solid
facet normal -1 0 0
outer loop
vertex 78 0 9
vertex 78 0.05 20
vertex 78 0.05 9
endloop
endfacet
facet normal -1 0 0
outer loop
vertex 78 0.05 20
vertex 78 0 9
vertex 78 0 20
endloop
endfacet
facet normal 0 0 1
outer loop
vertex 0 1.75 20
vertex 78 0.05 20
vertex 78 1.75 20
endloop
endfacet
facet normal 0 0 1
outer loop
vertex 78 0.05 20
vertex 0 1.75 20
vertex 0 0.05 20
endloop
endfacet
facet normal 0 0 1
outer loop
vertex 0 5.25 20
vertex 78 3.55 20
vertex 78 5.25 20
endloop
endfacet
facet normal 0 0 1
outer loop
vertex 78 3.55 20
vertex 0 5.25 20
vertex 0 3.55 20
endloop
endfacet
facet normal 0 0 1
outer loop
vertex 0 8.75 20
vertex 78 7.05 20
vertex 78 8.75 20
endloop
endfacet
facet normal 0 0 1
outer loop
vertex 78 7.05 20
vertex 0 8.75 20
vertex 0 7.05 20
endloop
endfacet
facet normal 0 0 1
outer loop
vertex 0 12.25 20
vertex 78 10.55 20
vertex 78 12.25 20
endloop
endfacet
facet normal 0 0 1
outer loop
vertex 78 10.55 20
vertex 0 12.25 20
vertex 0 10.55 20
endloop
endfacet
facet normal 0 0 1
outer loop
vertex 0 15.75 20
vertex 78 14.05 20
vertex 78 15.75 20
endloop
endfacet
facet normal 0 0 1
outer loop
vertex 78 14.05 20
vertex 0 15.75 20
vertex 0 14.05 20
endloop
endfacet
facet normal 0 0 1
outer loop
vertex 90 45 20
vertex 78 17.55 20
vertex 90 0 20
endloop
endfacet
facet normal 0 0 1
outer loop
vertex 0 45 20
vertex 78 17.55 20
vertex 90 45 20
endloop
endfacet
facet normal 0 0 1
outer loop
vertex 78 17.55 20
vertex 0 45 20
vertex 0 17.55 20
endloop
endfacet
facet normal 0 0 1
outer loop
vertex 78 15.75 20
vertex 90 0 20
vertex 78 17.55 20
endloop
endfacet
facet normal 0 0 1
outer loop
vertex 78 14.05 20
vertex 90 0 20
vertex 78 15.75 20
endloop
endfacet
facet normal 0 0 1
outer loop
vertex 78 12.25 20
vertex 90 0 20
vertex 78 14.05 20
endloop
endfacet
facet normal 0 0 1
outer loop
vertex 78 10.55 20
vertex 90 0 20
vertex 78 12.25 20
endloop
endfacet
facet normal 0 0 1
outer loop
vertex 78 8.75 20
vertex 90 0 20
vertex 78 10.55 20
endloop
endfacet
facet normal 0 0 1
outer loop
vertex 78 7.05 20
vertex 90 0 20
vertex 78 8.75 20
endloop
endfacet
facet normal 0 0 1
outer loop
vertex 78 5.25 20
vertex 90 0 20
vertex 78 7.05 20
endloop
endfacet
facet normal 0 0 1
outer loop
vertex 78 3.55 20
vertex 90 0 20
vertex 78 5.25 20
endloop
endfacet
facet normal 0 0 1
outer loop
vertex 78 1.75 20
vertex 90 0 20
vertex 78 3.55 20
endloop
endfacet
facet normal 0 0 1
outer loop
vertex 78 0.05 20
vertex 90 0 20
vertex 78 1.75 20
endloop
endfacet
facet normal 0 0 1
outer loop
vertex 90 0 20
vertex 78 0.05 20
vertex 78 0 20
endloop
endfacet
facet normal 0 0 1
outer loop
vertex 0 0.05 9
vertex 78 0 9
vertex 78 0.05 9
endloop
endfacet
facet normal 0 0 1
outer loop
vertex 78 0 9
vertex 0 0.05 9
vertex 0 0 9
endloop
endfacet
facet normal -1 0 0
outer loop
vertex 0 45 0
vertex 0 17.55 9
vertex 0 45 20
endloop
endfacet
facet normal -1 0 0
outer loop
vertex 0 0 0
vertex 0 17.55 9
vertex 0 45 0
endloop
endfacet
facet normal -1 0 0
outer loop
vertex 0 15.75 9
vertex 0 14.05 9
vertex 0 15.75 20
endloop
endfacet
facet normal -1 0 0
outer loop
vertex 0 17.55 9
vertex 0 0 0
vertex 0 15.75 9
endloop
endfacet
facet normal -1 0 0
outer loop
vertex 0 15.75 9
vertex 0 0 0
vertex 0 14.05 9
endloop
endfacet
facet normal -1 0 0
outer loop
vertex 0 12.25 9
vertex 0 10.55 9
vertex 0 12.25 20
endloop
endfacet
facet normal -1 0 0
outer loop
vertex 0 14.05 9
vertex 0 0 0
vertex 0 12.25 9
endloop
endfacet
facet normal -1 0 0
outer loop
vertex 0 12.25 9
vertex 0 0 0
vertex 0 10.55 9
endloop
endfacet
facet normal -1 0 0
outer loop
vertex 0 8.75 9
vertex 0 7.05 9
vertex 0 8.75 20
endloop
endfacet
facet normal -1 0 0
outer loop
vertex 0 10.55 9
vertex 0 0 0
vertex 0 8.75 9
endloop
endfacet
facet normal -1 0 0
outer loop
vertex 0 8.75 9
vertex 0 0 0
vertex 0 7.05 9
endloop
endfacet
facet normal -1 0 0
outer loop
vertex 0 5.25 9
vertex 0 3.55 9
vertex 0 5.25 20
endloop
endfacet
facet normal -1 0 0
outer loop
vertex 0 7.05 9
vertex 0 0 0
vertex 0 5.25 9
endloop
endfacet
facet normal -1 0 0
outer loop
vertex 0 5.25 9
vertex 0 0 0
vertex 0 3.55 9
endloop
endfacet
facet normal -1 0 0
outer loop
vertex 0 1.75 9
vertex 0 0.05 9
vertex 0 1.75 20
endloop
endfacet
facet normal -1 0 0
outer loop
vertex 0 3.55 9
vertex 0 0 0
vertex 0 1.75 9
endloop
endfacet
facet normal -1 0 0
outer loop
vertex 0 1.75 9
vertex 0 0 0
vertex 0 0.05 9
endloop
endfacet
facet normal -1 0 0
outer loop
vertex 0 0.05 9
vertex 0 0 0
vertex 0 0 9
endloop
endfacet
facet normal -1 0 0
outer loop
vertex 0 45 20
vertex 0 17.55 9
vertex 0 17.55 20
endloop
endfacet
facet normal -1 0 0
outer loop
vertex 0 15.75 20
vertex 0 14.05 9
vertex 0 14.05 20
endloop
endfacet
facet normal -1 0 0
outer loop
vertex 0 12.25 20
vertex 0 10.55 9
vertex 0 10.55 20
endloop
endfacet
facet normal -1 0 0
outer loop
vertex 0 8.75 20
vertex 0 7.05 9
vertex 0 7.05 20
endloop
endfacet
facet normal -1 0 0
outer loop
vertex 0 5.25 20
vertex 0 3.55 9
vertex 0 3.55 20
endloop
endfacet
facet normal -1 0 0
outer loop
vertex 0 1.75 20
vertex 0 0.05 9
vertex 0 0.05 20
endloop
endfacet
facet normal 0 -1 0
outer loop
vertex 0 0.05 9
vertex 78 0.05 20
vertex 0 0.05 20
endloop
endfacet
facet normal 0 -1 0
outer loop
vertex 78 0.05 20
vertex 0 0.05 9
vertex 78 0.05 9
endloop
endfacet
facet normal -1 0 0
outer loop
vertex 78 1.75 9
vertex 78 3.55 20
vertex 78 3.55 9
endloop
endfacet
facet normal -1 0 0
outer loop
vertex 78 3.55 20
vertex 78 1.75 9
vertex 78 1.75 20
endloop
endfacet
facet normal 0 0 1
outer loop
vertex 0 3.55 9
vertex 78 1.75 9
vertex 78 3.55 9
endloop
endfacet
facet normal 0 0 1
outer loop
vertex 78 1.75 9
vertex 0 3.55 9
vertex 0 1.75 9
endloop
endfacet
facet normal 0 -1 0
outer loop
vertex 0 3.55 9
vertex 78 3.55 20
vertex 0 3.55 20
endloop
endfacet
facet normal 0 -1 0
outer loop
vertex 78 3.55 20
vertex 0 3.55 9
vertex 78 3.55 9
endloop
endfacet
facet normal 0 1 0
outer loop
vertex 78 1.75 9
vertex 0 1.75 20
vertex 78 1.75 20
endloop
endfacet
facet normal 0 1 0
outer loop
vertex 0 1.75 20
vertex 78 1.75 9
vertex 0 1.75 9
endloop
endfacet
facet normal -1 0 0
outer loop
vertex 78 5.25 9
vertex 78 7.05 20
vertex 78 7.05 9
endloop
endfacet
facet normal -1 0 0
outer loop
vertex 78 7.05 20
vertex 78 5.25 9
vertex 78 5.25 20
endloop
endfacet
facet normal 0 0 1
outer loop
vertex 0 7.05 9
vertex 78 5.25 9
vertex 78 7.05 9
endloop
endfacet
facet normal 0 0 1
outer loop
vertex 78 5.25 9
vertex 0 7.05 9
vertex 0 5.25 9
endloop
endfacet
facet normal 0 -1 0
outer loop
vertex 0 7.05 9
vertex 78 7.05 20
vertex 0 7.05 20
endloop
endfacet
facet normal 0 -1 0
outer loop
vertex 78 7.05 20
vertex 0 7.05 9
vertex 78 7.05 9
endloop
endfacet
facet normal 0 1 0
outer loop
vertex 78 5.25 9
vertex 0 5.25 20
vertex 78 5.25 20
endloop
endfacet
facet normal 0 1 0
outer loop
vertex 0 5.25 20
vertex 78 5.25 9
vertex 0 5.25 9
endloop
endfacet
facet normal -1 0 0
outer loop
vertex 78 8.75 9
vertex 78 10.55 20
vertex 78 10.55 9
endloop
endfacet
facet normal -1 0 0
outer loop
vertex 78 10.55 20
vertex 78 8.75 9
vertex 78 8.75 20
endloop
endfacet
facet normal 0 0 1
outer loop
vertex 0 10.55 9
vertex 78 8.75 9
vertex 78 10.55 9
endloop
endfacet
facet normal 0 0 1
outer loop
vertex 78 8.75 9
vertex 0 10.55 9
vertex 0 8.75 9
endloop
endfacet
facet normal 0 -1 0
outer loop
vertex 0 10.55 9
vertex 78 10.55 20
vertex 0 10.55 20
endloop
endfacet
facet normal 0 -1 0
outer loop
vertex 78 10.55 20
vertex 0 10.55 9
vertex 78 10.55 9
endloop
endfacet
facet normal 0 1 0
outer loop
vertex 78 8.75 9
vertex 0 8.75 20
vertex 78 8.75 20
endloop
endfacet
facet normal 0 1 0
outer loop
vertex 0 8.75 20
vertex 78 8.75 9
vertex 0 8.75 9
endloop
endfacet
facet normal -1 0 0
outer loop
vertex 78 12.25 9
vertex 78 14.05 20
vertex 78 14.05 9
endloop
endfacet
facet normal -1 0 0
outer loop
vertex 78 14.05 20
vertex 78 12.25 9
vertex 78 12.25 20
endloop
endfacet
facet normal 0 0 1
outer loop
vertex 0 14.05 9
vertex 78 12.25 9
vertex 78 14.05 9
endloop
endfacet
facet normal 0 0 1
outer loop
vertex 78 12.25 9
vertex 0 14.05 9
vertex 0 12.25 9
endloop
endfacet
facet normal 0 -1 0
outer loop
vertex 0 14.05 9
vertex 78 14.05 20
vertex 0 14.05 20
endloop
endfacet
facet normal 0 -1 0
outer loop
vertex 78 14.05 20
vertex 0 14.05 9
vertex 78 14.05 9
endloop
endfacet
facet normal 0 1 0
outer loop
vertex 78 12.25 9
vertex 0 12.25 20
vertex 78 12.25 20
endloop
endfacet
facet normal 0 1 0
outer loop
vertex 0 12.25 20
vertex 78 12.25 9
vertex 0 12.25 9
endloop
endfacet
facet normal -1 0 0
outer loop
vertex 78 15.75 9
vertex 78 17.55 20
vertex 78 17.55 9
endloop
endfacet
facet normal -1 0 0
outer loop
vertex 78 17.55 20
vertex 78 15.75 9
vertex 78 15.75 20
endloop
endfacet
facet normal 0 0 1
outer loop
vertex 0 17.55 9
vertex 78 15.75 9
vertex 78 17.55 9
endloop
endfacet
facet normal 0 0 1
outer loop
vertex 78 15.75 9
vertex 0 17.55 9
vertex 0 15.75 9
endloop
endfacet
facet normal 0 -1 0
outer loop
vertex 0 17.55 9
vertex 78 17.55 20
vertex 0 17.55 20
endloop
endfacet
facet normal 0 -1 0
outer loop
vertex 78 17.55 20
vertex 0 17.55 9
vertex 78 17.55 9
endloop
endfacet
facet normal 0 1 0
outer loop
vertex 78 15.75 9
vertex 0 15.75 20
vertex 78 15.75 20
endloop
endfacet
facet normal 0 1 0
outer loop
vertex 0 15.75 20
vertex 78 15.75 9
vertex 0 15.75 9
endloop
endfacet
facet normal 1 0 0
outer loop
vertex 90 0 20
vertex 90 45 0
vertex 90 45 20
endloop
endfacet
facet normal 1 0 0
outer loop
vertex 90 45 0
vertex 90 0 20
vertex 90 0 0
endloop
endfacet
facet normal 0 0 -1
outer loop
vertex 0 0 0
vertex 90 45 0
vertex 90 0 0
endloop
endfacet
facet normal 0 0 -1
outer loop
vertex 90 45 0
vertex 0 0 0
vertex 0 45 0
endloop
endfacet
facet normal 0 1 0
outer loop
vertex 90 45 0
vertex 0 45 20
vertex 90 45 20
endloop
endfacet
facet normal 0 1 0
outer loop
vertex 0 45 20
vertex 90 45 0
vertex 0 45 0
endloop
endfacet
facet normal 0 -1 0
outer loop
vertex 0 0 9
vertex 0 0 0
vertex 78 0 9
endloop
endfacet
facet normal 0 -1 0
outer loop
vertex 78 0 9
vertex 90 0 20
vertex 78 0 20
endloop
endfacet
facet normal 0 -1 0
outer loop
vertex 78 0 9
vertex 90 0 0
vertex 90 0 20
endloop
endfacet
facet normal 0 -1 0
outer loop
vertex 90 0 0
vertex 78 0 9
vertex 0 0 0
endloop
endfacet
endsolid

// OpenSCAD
// Drying Rack for Microscope Slides

// Base Block Dimensions
base_length = 90;    // Length along X (mm) - Matches spec (90 mm)
base_width = 45;     // Width along Y (mm) - Matches spec (45 mm)
base_height = 20;    // Height along Z (mm) - Matches spec (20 mm)

// Slide Slot Dimensions
slot_length = 77;    // Length of the slot along X (mm) - Matches spec (77 mm)
slot_width = 1.6;    // Width of the slot along Y (mm) - Matches spec (1.6 mm)
slot_depth = 10;     // Depth of the slot into Z (mm) - Matches spec (10 mm)

// Slot Arrangement Parameters
num_slots = 10;      // Number of slots - Matches spec (10)
slot_spacing = 3.5;  // Center-to-center spacing between slots in Y - Matches spec (3.5 mm)

$fn = 64; // High resolution for curves

// --- Base Block ---
module base() {
    cube([base_length, base_width, base_height]);
}

// --- Slot Cutting Tool (Extruded shape) ---
// The slot is cut into the top face (Z=20). It needs to extend slightly past the faces.
module slot_cutter(x_offset, y_offset) {
    // The cutter must be long enough in X and deep enough in Z.
    // We make it slightly longer than the required 77mm cut length for safety/coplanarity rule.
    cut_length = slot_length + 1; // Extend past X faces (Ensures full cut)
    cut_width = slot_width + 0.2; // Extend slightly past Y faces (Ensures full cut)
    cut_depth = slot_depth + 1;  // Extend past Z face it cuts into (Ensures full cut)

    translate([x_offset, y_offset, base_height - cut_depth]) {
        cube([cut_length, cut_width, cut_depth]);
    }
}


// --- Assembly ---
difference() {
    // 1. The main solid block
    base();

    // 2. Subtract the slots
    for (i = [0 : num_slots - 1]) {
        // Calculate Y position for the center of the i-th slot group
        // Slots are centered on the block in Y.
        // Total width occupied by centers: (num_slots - 1) * slot_spacing
        // Center offset from origin (Y=0): -(Total spacing / 2) + (Spacing / 2)
        y_center = (i - (num_slots - 1) / 2.0) * slot_spacing;

        // The slots are centered on the block in X, so x_offset is 0.
        x_center = 0;

        slot_cutter(x_center, y_center);
    }
}
